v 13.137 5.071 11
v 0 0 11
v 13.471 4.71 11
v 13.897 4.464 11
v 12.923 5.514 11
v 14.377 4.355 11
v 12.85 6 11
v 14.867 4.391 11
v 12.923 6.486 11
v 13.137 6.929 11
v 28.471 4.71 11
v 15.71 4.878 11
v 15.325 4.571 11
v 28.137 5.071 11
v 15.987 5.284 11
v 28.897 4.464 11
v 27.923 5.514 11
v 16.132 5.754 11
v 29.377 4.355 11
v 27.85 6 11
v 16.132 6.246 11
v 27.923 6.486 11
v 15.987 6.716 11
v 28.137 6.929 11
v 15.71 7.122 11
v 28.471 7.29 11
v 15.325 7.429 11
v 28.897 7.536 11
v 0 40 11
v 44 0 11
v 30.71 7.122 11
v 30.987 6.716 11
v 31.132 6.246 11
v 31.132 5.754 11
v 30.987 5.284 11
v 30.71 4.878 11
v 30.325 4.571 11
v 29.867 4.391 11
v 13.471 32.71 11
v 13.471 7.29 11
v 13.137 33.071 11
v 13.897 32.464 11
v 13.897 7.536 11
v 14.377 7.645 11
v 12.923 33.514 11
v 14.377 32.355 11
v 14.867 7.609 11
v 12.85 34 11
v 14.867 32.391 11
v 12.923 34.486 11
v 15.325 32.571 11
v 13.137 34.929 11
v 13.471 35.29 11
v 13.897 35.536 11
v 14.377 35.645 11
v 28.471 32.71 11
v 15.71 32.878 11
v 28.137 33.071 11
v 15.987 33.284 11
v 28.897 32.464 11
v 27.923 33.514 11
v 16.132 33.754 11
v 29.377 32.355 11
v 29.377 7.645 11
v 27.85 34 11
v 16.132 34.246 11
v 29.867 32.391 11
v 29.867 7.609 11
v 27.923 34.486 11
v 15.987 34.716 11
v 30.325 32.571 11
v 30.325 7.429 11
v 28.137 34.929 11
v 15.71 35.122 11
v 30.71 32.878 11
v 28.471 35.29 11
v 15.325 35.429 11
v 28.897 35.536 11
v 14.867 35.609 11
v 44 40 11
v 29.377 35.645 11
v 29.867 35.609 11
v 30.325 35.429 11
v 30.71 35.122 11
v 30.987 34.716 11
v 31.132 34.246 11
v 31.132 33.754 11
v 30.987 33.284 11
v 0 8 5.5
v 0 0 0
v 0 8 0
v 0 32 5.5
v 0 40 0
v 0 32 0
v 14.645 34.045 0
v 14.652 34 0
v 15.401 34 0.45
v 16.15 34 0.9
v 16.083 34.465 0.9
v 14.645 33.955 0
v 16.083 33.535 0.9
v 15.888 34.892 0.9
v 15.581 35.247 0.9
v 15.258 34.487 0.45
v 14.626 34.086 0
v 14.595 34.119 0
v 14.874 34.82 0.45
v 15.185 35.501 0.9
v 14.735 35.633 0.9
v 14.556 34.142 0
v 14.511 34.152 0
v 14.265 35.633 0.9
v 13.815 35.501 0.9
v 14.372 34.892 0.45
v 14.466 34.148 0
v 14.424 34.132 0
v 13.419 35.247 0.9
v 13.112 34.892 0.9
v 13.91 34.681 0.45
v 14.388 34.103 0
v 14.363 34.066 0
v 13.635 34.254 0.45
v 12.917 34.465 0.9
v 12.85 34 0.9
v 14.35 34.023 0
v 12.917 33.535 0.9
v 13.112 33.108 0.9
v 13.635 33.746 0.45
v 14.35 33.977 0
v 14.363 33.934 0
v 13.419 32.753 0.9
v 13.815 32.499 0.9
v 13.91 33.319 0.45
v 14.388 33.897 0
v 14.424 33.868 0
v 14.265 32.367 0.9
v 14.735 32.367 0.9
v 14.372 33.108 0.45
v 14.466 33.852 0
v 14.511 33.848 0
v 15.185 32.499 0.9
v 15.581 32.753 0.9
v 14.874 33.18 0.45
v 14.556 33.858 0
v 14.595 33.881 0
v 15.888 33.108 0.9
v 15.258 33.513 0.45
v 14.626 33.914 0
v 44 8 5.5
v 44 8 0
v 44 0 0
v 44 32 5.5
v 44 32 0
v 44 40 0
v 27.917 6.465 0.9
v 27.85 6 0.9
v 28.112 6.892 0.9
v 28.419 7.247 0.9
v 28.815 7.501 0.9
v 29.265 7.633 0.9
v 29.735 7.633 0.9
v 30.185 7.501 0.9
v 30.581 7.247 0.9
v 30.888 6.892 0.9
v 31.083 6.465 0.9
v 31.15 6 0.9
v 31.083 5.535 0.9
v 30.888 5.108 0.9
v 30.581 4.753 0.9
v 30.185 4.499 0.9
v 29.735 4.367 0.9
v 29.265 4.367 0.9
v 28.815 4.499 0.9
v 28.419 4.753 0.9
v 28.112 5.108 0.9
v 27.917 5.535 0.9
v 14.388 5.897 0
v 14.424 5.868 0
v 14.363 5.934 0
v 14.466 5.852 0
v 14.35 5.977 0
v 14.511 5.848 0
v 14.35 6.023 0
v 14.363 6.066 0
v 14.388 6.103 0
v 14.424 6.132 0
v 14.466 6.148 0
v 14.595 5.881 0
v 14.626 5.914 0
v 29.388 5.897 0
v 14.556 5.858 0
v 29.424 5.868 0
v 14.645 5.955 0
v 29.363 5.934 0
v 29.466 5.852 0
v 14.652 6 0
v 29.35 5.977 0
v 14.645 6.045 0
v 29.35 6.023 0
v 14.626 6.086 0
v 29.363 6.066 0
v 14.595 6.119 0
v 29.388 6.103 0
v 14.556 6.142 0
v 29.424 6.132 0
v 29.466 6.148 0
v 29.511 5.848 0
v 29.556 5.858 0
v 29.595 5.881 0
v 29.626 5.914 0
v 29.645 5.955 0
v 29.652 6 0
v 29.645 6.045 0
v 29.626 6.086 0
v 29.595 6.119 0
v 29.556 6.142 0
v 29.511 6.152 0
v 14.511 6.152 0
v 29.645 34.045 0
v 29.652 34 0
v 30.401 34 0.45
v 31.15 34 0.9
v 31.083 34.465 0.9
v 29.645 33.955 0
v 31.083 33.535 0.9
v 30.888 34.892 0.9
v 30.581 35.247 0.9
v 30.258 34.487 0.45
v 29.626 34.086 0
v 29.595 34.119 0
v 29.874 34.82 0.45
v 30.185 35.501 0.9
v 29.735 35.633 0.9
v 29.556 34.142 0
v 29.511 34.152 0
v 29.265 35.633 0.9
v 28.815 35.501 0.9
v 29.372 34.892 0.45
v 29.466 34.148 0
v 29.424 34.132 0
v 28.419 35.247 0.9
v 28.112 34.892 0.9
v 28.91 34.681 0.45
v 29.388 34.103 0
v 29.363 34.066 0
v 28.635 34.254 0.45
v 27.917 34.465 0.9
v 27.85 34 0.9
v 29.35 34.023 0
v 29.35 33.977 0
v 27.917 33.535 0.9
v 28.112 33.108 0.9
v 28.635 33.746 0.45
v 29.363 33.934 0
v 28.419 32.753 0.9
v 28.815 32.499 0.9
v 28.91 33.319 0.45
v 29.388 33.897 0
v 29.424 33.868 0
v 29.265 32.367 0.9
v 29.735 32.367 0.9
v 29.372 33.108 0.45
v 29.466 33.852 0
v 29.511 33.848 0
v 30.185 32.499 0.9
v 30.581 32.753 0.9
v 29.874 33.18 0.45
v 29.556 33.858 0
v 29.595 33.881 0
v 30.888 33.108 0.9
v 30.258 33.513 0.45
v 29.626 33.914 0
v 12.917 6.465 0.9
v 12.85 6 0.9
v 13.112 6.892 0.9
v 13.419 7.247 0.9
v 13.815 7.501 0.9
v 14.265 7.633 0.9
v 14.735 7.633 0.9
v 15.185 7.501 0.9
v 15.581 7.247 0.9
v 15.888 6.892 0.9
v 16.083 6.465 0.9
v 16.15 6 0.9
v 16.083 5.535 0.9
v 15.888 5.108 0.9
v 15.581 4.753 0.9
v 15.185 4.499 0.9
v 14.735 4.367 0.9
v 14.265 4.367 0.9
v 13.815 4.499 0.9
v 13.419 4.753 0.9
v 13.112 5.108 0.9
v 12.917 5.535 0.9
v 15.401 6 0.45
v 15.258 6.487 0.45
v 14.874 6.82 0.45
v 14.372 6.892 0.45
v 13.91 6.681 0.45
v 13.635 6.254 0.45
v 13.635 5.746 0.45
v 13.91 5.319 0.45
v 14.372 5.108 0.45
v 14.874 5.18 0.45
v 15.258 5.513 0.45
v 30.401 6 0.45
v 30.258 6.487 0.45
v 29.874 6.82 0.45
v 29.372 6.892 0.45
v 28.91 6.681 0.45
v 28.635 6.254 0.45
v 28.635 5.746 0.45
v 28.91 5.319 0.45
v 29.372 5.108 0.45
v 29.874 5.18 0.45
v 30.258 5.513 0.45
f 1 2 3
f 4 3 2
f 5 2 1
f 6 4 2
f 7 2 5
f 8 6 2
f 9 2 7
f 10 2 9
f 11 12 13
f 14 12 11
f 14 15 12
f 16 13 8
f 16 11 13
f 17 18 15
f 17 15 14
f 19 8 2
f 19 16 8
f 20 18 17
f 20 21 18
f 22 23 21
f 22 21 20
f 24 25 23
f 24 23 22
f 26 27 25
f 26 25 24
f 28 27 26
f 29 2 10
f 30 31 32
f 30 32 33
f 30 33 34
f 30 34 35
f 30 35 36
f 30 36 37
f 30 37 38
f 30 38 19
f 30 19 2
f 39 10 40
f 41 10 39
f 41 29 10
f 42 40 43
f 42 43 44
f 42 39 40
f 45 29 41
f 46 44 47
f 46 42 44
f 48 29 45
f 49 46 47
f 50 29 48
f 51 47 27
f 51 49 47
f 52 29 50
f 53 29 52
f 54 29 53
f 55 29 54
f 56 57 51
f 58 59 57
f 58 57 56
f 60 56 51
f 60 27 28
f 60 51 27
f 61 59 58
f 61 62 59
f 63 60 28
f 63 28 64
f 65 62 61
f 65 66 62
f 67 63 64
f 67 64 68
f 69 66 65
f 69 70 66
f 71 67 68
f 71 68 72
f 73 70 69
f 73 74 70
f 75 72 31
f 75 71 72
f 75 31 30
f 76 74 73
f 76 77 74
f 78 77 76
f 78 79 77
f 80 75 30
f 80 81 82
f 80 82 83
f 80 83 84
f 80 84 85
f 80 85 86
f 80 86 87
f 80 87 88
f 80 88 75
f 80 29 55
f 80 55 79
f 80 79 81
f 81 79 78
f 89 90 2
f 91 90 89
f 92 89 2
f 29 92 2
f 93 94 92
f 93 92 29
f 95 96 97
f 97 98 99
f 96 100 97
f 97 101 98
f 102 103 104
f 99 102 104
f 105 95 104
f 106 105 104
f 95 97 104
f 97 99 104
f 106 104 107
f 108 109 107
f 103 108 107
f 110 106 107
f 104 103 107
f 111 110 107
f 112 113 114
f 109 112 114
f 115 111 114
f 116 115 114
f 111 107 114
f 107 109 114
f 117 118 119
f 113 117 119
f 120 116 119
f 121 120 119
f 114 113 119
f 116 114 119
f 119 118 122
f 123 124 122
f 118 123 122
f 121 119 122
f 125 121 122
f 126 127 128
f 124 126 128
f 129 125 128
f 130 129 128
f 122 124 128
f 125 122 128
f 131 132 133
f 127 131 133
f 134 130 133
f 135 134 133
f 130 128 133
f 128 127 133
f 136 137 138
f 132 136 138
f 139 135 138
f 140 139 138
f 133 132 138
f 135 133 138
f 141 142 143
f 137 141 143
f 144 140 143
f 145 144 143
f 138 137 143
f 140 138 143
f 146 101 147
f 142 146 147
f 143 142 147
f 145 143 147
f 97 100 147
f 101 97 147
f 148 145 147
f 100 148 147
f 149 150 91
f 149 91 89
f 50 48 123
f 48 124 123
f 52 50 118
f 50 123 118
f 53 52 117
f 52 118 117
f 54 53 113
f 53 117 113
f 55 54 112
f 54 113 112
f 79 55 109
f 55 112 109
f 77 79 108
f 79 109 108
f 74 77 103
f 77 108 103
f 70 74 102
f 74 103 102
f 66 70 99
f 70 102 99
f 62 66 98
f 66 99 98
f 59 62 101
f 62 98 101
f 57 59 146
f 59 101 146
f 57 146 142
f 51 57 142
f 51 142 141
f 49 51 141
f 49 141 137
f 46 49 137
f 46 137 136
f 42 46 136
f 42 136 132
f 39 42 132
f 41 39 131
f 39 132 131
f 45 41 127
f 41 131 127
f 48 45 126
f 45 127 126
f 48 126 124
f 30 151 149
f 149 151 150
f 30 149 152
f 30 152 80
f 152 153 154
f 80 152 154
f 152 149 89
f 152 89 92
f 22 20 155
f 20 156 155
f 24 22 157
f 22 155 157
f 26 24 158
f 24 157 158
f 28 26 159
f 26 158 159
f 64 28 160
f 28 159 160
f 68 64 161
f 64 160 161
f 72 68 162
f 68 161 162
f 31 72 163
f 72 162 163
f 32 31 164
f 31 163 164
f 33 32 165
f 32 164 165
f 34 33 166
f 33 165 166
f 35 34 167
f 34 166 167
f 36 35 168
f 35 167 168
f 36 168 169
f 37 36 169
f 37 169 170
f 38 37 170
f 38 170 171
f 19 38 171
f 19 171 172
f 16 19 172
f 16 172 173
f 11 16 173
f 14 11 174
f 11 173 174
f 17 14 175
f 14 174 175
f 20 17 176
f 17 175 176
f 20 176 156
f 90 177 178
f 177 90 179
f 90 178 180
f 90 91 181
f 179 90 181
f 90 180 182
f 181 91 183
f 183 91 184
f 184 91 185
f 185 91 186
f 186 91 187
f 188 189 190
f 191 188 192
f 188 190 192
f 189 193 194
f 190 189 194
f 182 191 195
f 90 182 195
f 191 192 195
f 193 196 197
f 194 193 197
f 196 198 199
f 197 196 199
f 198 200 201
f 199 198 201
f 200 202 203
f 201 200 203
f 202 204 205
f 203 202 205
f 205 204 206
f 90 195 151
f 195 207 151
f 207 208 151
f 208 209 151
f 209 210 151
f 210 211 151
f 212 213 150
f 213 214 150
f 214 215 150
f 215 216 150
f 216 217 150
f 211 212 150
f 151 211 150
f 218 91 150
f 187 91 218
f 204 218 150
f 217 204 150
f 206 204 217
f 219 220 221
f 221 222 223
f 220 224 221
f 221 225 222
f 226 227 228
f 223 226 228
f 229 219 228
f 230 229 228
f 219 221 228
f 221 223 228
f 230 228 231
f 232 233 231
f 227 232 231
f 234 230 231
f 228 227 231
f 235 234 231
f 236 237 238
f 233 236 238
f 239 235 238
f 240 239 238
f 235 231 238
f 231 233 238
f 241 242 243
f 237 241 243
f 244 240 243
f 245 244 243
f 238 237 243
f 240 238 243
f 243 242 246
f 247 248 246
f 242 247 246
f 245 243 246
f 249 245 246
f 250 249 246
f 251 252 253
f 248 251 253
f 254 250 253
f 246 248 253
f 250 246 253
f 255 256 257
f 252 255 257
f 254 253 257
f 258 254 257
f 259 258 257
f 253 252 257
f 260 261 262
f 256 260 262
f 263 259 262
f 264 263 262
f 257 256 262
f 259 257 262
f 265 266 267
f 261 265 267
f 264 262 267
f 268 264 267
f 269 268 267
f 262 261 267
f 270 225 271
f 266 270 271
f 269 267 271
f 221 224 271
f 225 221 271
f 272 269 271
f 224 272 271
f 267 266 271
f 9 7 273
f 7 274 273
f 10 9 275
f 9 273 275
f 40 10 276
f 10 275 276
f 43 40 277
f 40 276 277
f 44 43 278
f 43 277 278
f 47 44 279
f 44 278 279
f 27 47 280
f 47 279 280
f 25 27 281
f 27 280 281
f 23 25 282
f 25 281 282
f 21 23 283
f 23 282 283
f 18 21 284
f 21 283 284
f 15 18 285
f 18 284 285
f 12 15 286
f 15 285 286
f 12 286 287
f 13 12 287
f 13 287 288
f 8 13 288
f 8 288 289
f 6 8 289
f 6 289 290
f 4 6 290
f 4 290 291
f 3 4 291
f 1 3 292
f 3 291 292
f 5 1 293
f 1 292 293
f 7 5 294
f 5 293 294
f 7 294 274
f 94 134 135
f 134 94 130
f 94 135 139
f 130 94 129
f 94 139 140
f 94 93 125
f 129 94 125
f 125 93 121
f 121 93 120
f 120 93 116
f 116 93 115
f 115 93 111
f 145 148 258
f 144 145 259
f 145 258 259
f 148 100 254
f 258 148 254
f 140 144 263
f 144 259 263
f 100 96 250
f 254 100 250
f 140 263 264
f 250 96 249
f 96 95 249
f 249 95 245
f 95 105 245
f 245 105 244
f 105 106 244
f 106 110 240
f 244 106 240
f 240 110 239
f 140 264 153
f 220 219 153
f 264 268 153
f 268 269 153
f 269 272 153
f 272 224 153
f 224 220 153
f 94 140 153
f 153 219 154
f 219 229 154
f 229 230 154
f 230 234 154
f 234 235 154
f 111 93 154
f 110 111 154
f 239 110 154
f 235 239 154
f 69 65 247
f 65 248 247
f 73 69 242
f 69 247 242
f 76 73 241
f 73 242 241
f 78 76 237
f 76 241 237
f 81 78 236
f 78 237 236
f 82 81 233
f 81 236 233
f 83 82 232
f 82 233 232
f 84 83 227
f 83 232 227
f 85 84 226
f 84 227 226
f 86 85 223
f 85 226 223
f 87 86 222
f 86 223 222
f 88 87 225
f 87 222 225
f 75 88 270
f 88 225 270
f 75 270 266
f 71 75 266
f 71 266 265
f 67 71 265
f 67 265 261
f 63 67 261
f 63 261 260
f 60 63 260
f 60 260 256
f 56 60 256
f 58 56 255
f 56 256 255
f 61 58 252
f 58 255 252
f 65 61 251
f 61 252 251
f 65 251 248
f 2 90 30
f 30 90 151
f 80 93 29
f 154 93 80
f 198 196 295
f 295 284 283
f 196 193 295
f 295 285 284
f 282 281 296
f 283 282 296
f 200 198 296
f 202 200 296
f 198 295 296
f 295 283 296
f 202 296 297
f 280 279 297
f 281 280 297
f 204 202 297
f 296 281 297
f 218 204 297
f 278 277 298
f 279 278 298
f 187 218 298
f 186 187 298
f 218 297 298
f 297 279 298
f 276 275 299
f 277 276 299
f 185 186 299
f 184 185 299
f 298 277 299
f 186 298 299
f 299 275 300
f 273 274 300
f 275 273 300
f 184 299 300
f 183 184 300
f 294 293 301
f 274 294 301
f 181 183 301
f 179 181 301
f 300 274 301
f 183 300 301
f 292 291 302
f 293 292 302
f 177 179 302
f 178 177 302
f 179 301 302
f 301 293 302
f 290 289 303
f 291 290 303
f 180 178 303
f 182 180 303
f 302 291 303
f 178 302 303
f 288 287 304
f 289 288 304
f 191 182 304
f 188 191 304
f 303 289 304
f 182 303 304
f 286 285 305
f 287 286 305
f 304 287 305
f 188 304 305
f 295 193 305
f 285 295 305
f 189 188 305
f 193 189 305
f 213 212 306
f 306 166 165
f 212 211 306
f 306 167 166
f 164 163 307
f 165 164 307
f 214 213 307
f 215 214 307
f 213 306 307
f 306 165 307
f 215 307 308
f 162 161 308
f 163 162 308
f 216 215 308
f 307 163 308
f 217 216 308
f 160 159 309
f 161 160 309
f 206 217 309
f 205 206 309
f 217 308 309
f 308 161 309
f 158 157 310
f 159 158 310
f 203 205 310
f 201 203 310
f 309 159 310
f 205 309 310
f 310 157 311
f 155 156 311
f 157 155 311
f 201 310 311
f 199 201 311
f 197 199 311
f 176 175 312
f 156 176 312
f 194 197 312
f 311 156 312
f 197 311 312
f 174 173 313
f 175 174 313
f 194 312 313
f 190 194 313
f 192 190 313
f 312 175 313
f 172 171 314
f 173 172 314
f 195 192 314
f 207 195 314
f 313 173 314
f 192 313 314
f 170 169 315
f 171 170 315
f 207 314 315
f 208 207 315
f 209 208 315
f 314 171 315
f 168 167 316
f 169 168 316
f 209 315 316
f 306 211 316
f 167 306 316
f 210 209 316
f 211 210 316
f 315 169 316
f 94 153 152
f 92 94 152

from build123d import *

# Parameters (mm, degrees)
SKETCH_1_W             = 44
SKETCH_1_H             = 40
EXTRUDE_1_DEPTH        = 11
SKETCH_2_W             = 5.5
SKETCH_2_H             = 24
CUT_EXTRUDE_1_DEPTH    = 61.473134531
HOLE_WIZARD_M4_1_D     = 3.3
HOLE_WIZARD_M4_1_DEPTH = 10.1
HOLE_WIZARD_M4_1_TIP   = 0.991420021


with BuildPart() as part:
    # 草图1 → 凸台-拉伸1 (new body)
    with BuildSketch(Plane.XY):
        with Locations((22, 20)):
            Rectangle(SKETCH_1_W, SKETCH_1_H)
    extrude(amount=EXTRUDE_1_DEPTH)

    # 草图2 → 切除-拉伸1 (cut, through all)
    with BuildSketch(Plane.ZY):
        with Locations((2.75, 20)):
            Rectangle(SKETCH_2_W, SKETCH_2_H)
    extrude(amount=-CUT_EXTRUDE_1_DEPTH, mode=Mode.SUBTRACT)

    # M4 螺纹孔1
    with Locations(Plane.XY.offset(11)):
        with Locations((14.5, 34), (29.5, 34), (14.5, 6), (29.5, 6)):
            Hole(HOLE_WIZARD_M4_1_D / 2, depth=HOLE_WIZARD_M4_1_DEPTH)
            with Locations((0, 0, -(HOLE_WIZARD_M4_1_DEPTH + HOLE_WIZARD_M4_1_TIP / 2))):  # 118° drill point
                Cone(0, HOLE_WIZARD_M4_1_D / 2, HOLE_WIZARD_M4_1_TIP, mode=Mode.SUBTRACT)


solid = part.part
